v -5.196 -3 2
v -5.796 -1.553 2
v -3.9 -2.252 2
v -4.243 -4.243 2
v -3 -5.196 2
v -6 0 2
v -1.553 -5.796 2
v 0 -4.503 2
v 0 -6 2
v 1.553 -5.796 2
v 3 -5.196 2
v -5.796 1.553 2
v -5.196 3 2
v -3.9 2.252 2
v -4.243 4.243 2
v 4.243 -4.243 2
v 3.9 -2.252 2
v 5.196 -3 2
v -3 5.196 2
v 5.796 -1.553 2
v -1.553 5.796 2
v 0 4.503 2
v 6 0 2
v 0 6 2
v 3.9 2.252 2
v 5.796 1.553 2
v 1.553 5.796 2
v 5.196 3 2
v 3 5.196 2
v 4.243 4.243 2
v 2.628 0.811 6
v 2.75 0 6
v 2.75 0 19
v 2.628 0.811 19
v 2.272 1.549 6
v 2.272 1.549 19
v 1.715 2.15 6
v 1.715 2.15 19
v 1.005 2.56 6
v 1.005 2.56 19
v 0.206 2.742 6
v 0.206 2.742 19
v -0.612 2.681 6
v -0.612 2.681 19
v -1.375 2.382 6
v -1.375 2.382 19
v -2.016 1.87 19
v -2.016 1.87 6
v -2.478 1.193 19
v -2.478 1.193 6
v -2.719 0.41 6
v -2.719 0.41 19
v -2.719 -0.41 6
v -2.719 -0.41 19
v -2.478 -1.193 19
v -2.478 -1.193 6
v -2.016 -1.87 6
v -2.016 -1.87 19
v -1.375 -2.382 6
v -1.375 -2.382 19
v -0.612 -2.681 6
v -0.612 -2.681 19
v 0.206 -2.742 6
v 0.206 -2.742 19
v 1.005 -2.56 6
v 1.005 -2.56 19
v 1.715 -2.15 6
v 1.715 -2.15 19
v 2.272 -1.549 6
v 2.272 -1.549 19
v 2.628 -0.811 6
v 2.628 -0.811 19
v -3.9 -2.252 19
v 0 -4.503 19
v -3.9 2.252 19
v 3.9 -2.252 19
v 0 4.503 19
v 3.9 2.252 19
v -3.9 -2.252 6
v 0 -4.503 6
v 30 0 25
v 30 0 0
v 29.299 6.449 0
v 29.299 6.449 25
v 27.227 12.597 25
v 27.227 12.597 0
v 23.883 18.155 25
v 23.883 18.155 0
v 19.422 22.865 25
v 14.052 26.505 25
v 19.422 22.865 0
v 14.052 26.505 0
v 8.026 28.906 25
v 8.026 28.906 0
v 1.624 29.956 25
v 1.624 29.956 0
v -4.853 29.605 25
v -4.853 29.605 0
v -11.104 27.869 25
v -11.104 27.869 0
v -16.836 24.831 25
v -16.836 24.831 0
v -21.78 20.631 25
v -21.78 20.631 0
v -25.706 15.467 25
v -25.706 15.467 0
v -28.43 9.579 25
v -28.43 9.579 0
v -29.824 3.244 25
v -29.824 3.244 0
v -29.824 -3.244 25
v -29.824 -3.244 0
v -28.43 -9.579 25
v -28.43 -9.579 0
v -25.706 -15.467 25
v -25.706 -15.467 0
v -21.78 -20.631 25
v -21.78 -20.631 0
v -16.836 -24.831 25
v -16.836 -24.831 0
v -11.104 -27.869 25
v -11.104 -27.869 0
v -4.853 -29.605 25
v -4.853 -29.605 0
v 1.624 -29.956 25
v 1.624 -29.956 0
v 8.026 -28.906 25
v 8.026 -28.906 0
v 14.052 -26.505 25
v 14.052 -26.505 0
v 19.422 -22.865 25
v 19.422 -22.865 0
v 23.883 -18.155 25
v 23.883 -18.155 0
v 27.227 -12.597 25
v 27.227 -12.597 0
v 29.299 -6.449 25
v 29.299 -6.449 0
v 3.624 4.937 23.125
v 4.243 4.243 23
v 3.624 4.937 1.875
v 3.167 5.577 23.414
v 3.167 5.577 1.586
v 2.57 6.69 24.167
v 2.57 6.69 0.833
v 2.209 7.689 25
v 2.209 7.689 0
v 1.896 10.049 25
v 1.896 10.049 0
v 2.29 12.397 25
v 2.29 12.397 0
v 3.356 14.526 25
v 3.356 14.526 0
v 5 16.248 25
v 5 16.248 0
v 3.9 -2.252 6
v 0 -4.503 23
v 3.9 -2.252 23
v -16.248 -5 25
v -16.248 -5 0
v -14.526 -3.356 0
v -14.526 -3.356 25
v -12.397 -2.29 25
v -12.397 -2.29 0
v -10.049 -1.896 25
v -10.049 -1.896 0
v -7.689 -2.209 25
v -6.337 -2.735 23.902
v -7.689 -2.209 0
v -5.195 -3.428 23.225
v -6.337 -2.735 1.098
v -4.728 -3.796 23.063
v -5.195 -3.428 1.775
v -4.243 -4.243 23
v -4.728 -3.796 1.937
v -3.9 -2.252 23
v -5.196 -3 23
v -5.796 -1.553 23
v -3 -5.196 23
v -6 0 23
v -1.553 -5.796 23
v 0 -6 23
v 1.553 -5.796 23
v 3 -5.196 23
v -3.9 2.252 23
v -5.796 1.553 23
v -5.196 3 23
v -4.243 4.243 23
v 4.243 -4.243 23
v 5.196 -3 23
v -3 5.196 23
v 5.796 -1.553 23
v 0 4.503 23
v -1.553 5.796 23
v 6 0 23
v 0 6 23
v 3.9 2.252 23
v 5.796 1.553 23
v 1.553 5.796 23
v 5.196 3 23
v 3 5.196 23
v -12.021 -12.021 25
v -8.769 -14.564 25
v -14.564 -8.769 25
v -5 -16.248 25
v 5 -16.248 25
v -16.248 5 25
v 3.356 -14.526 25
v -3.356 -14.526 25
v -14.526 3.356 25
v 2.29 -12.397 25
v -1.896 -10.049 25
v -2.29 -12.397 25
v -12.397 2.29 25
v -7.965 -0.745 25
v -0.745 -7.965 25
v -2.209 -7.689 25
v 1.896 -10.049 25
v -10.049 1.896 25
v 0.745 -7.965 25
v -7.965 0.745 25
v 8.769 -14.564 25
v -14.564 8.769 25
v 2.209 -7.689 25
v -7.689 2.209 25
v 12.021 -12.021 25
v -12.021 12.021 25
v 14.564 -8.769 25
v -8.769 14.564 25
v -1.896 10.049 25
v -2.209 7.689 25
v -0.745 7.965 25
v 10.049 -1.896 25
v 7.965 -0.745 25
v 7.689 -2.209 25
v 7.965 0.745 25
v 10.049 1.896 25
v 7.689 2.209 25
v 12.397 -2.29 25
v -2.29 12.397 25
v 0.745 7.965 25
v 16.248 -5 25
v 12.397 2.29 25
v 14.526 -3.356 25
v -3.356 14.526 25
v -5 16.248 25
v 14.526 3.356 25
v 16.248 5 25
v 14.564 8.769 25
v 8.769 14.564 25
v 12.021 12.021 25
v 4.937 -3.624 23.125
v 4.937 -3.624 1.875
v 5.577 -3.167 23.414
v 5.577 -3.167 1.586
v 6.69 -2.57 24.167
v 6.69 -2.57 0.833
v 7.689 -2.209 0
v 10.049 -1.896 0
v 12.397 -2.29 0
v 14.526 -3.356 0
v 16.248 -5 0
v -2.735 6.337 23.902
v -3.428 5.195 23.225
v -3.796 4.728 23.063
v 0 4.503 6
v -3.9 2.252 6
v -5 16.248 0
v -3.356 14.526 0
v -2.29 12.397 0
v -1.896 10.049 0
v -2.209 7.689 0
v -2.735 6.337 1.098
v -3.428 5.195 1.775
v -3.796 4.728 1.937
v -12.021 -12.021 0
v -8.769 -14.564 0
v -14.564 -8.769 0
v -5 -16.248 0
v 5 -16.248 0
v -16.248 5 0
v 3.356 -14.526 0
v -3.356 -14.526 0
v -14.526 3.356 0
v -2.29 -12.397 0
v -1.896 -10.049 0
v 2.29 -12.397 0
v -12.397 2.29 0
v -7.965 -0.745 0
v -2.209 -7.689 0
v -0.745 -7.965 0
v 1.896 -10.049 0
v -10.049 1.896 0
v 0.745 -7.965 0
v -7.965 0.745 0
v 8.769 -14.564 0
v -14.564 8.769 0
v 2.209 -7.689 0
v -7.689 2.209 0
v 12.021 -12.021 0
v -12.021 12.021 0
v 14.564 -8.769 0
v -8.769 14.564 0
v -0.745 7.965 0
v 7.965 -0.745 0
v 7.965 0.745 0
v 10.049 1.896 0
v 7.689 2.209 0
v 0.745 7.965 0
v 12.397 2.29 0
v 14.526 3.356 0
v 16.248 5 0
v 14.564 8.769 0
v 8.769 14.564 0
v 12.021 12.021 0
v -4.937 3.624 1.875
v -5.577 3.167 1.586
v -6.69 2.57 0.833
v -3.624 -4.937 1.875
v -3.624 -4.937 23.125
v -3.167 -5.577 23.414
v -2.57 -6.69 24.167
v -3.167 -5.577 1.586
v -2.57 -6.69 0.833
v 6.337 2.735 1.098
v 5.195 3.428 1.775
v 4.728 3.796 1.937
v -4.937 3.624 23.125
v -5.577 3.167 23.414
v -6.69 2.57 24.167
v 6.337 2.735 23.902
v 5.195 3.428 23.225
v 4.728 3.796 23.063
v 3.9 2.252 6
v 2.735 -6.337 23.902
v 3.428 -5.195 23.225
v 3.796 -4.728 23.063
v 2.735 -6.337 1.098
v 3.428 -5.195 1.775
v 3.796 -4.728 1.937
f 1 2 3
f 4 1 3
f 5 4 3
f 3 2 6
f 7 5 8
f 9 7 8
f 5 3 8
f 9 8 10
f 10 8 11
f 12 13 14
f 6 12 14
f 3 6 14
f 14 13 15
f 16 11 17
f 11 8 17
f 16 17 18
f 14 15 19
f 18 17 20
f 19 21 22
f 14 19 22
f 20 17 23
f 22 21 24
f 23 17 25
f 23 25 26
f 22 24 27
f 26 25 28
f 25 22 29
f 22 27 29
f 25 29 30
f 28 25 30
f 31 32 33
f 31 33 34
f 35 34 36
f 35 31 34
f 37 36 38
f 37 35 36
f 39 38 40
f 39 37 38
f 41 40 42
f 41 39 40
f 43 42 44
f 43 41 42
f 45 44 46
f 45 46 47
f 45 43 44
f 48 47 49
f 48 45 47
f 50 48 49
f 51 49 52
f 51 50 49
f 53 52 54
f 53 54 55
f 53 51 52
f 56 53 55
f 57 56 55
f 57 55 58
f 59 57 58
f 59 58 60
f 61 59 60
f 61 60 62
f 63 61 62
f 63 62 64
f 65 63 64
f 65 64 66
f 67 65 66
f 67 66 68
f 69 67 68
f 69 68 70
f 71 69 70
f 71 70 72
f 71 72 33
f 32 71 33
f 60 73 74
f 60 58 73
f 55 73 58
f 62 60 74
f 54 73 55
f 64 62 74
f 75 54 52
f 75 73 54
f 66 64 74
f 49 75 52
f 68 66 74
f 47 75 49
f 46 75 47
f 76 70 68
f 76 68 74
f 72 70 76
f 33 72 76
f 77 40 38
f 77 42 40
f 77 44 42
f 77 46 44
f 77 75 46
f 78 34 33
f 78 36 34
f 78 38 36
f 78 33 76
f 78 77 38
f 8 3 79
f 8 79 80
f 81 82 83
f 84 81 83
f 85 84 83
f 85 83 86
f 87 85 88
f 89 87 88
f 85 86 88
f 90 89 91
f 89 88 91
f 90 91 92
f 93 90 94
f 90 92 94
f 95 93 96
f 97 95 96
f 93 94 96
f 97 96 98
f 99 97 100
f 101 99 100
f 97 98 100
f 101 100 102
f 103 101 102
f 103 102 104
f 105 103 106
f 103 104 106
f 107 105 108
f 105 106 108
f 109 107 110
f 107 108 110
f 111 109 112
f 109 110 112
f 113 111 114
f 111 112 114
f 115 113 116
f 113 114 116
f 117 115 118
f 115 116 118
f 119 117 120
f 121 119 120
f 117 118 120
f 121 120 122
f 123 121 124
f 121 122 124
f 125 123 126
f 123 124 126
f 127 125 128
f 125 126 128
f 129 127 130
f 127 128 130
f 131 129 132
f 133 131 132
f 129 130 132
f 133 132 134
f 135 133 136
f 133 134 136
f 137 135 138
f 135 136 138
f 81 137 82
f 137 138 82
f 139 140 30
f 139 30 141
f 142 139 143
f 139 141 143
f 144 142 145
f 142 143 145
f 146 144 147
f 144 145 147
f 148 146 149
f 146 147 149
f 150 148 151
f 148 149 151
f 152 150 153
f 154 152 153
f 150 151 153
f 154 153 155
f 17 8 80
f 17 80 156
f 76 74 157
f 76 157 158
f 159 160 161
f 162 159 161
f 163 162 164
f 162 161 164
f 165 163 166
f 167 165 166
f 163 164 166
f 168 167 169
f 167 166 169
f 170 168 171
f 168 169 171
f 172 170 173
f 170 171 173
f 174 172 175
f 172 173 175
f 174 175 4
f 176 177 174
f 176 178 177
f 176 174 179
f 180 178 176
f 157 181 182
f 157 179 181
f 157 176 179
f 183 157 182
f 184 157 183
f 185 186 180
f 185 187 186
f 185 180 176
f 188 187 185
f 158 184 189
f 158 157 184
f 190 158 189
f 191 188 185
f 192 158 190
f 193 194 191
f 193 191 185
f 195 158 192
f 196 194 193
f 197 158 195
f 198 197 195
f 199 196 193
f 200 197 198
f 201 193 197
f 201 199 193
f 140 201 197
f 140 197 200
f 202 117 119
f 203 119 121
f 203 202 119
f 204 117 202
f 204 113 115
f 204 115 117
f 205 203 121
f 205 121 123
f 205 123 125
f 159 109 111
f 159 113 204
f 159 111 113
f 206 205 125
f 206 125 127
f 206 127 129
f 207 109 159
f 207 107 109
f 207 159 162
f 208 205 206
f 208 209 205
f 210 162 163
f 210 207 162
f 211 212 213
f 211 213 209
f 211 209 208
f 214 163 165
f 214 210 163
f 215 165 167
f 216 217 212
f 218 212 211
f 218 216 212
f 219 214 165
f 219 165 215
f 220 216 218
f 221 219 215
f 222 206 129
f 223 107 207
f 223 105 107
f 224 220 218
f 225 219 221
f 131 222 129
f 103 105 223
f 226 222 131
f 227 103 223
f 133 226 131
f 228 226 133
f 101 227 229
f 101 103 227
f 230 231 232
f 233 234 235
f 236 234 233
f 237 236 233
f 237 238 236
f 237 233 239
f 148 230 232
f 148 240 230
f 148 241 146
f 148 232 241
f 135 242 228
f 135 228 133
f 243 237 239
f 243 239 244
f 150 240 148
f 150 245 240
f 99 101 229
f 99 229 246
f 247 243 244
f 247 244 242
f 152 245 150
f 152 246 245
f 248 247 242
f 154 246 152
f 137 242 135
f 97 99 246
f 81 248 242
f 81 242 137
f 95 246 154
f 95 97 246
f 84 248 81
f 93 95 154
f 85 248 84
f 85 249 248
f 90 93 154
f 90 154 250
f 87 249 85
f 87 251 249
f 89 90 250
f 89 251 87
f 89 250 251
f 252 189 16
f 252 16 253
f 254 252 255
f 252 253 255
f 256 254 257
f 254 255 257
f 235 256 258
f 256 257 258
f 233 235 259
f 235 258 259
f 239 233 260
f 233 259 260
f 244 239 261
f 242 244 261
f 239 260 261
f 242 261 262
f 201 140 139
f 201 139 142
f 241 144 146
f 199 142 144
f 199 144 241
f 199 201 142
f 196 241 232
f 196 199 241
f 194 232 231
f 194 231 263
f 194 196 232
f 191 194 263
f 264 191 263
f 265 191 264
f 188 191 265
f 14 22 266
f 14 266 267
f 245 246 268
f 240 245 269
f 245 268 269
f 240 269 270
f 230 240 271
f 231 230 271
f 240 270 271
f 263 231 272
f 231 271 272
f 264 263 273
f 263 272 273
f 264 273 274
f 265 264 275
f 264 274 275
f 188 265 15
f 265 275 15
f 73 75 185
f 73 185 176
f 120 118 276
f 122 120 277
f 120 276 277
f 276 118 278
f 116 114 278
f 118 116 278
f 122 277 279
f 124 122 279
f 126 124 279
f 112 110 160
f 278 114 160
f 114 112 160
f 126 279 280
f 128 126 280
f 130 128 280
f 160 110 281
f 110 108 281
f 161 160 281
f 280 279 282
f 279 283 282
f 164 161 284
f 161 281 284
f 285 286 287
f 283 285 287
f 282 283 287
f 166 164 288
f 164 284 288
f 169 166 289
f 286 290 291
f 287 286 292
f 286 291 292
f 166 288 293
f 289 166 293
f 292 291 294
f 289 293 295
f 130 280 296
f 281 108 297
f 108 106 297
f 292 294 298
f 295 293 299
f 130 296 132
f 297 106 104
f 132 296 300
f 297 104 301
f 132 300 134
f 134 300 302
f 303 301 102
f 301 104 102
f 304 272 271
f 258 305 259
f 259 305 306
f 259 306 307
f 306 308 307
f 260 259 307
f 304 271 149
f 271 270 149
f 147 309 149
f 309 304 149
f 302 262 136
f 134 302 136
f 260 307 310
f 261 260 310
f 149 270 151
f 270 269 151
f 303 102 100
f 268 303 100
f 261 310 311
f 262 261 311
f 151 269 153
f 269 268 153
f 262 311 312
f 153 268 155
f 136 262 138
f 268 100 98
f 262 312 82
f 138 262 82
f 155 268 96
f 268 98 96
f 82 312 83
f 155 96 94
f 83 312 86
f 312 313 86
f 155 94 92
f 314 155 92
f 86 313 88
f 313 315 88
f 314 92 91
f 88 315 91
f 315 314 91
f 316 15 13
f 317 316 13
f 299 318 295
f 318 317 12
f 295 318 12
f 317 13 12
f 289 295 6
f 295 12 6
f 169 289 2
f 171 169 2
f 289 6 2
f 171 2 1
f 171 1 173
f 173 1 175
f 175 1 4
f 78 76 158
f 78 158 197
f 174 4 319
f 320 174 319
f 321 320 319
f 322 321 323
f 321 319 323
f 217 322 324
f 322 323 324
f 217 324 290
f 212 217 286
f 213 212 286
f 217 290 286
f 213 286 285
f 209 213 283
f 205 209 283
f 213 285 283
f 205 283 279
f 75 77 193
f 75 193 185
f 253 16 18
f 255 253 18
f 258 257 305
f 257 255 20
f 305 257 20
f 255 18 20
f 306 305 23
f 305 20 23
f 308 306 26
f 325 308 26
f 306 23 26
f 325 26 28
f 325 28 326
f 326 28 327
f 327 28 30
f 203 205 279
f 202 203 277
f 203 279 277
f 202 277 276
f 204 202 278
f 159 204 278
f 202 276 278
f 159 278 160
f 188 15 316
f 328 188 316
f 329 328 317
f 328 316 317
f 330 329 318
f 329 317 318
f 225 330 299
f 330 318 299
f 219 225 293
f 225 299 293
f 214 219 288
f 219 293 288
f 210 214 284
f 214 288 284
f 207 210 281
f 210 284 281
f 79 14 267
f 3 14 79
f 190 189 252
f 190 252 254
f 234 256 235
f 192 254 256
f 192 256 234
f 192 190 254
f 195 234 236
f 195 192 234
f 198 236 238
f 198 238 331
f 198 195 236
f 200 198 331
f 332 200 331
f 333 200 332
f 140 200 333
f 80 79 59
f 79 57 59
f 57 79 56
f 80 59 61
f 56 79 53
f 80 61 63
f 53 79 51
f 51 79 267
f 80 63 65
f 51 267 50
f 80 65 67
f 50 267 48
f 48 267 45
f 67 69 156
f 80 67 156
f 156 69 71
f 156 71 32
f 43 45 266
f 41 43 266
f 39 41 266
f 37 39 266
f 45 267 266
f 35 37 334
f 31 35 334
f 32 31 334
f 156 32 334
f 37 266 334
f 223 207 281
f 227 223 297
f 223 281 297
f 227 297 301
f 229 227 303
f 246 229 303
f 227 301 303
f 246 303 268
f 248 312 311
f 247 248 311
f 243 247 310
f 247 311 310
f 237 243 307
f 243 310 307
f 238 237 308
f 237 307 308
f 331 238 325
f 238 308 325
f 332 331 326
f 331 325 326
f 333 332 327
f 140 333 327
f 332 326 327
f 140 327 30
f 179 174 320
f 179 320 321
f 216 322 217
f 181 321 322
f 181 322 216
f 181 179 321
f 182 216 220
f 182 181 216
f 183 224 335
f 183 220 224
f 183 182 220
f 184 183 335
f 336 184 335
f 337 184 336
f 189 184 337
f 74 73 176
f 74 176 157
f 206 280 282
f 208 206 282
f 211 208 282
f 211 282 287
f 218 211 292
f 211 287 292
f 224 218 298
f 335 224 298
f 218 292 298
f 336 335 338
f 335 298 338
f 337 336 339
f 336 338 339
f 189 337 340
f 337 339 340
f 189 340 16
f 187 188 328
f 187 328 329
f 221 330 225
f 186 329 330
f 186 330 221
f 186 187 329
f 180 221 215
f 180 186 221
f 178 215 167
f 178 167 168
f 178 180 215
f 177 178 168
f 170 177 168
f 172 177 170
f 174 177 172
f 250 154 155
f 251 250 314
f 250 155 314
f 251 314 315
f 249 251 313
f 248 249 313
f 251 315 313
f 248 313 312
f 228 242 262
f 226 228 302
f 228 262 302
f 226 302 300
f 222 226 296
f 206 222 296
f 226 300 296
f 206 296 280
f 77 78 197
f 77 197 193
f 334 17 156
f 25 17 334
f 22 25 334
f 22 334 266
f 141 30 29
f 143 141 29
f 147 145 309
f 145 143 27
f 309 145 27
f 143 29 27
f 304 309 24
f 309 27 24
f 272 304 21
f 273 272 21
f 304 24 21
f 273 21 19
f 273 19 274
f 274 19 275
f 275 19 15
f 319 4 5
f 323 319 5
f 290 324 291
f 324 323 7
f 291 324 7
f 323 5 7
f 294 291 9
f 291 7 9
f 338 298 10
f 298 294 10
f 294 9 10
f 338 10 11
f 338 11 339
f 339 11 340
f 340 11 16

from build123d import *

# Parameters (mm, degrees)
F0_R     = 30
F0_R_2   = 3
F1_DEPTH = 25
F2_START = 2
F0_R_3   = 2.75
F2_DEPTH = 21
F4_DEPTH = 6
F5_START = 19
F5_DEPTH = 4


# Not quite as in the source:
# - a fillet or chamfer that OpenCascade refuses, or shapes differently, is made with other operations: its cross-section is extruded or revolved along the edge and cut away or added
# - a feature names something its author has since deleted; it is built from what else it names


with BuildPart() as f1:
    # F0 (on Top) → F1 (new body)
    with BuildSketch(Plane.XY):
        Circle(F0_R)
        with BuildLine():
            ThreePointArc((16.2480768093, 5), (16.8109682314, 2.5281113744), (17, 0))
            ThreePointArc((17, 0), (16.8109682314, -2.5281113744), (16.2480768093, -5))
            ThreePointArc((16.2480768093, -5), (12.0208152802, -12.0208152802), (5, -16.2480768093))
            ThreePointArc((5, -16.2480768093), (0, -17), (-5, -16.2480768093))
            ThreePointArc((-5, -16.2480768093), (-12.0208152802, -12.0208152802), (-16.2480768093, -5))
            ThreePointArc((-16.2480768093, -5), (-17, 0), (-16.2480768093, 5))
            ThreePointArc((-16.2480768093, 5), (-12.0208152802, 12.0208152802), (-5, 16.2480768093))
            ThreePointArc((-5, 16.2480768093), (0, 17), (5, 16.2480768093))
            ThreePointArc((5, 16.2480768093), (12.0208152802, 12.0208152802), (16.2480768093, 5))
        make_face(mode=Mode.SUBTRACT)
        with BuildLine():
            ThreePointArc((16.2480768093, -5), (16.8109682314, -2.5281113744), (17, 0))
            ThreePointArc((17, 0), (16.8109682314, 2.5281113744), (16.2480768093, 5))
            ThreePointArc((16.2480768093, 5), (10.4163777832, 1.9103772572), (4.2426406998, 4.2426406745))
            ThreePointArc((4.2426406998, 4.2426406745), (5.5432771985, 2.2961005859), (6, 0))
            ThreePointArc((6, 0), (5.5432771928, -2.2961005997), (4.2426406787, -4.2426406956))
            ThreePointArc((4.2426406787, -4.2426406956), (10.4163777683, -1.9103772563), (16.2480768093, -5))
        make_face()
        with BuildLine():
            ThreePointArc((4.2426406998, 4.2426406745), (1.9103772561, 10.4163777654), (5, 16.2480768093))
            ThreePointArc((5, 16.2480768093), (0, 17), (-5, 16.2480768093))
            ThreePointArc((-5, 16.2480768093), (-1.9103772567, 10.4163777743), (-4.2426406871, 4.2426406871))
            ThreePointArc((-4.2426406871, 4.2426406871), (8.9e-09, 6), (4.2426406998, 4.2426406745))
        make_face()
        with BuildLine():
            ThreePointArc((6, 0), (5.5432771985, 2.2961005859), (4.2426406998, 4.2426406745))
            ThreePointArc((4.2426406998, 4.2426406745), (8.9e-09, 6), (-4.2426406871, 4.2426406871))
            ThreePointArc((-4.2426406871, 4.2426406871), (-6, 4e-10), (-4.2426406877, -4.2426406865))
            ThreePointArc((-4.2426406877, -4.2426406865), (-6.4e-09, -6), (4.2426406787, -4.2426406956))
            ThreePointArc((4.2426406787, -4.2426406956), (5.5432771928, -2.2961005997), (6, 0))
        make_face()
        Polygon((0, -4.5033320997), (-3.9, -2.2516660498), (-3.9, 2.2516660498), (0, 4.5033320997), (3.9, 2.2516660498), (3.9, -2.2516660498), align=None, mode=Mode.SUBTRACT)
        with BuildLine():
            ThreePointArc((-5, -16.2480768093), (0, -17), (5, -16.2480768093))
            ThreePointArc((5, -16.2480768093), (1.910377257, -10.4163777803), (4.2426406787, -4.2426406956))
            ThreePointArc((4.2426406787, -4.2426406956), (-6.4e-09, -6), (-4.2426406877, -4.2426406865))
            ThreePointArc((-4.2426406877, -4.2426406865), (-1.9103772566, -10.4163777739), (-5, -16.2480768093))
        make_face()
        with BuildLine():
            ThreePointArc((-4.2426406877, -4.2426406865), (-6, 4e-10), (-4.2426406871, 4.2426406871))
            ThreePointArc((-4.2426406871, 4.2426406871), (-10.4163777743, 1.9103772567), (-16.2480768093, 5))
            ThreePointArc((-16.2480768093, 5), (-17, 0), (-16.2480768093, -5))
            ThreePointArc((-16.2480768093, -5), (-10.4163777747, -1.9103772567), (-4.2426406877, -4.2426406865))
        make_face()
        Polygon((-3.9, 2.2516660498), (-3.9, -2.2516660498), (0, -4.5033320997), (3.9, -2.2516660498), (3.9, 2.2516660498), (0, 4.5033320997), align=None)
        Circle(F0_R_2, mode=Mode.SUBTRACT)
    extrude(amount=F1_DEPTH)

    # F0 (on Top) → F2 (join)
    with BuildSketch(Plane.XY.offset(F2_START)):
        Circle(F0_R_2)
        Circle(F0_R_3, mode=Mode.SUBTRACT)
    extrude(amount=F2_DEPTH)

    # F3: chamfer of 5 on 2 edges, made by hand


with BuildPart() as f3_tool2:
    # F3_s3 → F3_t4 (revolve)
    with BuildSketch(Plane.XZ):
        Polygon((8, 0), (3, 5), (3, 0), align=None)
    revolve(axis=Axis((0, 0, 0), (0, 0, 1)))

    split(bisect_by=Plane.XY.offset(2), keep=Keep.BOTTOM)


with BuildPart() as f1_1:
    add(f1.part)

    # F3_t1: cut F3_tool2
    add(f3_tool2.part, mode=Mode.SUBTRACT)


with BuildPart() as f3_tool7:
    # F3_s8 → F3_t9 (revolve)
    with BuildSketch(Plane.XZ):
        Polygon((8, 25), (3, 20), (3, 25), align=None)
    revolve(axis=Axis((0, 0, 25), (0, 0, 1)))

    split(bisect_by=Plane.XY.offset(23), keep=Keep.TOP)


with BuildPart() as f1_2:
    add(f1_1.part)

    # F3_t6: cut F3_tool7
    add(f3_tool7.part, mode=Mode.SUBTRACT)

    # F0 (on Top) → F4 (cut)
    with BuildSketch(Plane.XY):
        Polygon((-3.9, 2.2516660498), (-3.9, -2.2516660498), (0, -4.5033320997), (3.9, -2.2516660498), (3.9, 2.2516660498), (0, 4.5033320997), align=None)
        Circle(F0_R_2, mode=Mode.SUBTRACT)
        Circle(F0_R_2)
        Circle(F0_R_3, mode=Mode.SUBTRACT)
        Circle(F0_R_3)
    extrude(amount=F4_DEPTH, mode=Mode.SUBTRACT)

    # F0 (on Top) → F5 (cut)
    with BuildSketch(Plane.XY.offset(F5_START)):
        Polygon((-3.9, 2.2516660498), (-3.9, -2.2516660498), (0, -4.5033320997), (3.9, -2.2516660498), (3.9, 2.2516660498), (0, 4.5033320997), align=None)
        Circle(F0_R_2, mode=Mode.SUBTRACT)
        Circle(F0_R_2)
        Circle(F0_R_3, mode=Mode.SUBTRACT)
    extrude(amount=F5_DEPTH, mode=Mode.SUBTRACT)


solid = f1_2.part
